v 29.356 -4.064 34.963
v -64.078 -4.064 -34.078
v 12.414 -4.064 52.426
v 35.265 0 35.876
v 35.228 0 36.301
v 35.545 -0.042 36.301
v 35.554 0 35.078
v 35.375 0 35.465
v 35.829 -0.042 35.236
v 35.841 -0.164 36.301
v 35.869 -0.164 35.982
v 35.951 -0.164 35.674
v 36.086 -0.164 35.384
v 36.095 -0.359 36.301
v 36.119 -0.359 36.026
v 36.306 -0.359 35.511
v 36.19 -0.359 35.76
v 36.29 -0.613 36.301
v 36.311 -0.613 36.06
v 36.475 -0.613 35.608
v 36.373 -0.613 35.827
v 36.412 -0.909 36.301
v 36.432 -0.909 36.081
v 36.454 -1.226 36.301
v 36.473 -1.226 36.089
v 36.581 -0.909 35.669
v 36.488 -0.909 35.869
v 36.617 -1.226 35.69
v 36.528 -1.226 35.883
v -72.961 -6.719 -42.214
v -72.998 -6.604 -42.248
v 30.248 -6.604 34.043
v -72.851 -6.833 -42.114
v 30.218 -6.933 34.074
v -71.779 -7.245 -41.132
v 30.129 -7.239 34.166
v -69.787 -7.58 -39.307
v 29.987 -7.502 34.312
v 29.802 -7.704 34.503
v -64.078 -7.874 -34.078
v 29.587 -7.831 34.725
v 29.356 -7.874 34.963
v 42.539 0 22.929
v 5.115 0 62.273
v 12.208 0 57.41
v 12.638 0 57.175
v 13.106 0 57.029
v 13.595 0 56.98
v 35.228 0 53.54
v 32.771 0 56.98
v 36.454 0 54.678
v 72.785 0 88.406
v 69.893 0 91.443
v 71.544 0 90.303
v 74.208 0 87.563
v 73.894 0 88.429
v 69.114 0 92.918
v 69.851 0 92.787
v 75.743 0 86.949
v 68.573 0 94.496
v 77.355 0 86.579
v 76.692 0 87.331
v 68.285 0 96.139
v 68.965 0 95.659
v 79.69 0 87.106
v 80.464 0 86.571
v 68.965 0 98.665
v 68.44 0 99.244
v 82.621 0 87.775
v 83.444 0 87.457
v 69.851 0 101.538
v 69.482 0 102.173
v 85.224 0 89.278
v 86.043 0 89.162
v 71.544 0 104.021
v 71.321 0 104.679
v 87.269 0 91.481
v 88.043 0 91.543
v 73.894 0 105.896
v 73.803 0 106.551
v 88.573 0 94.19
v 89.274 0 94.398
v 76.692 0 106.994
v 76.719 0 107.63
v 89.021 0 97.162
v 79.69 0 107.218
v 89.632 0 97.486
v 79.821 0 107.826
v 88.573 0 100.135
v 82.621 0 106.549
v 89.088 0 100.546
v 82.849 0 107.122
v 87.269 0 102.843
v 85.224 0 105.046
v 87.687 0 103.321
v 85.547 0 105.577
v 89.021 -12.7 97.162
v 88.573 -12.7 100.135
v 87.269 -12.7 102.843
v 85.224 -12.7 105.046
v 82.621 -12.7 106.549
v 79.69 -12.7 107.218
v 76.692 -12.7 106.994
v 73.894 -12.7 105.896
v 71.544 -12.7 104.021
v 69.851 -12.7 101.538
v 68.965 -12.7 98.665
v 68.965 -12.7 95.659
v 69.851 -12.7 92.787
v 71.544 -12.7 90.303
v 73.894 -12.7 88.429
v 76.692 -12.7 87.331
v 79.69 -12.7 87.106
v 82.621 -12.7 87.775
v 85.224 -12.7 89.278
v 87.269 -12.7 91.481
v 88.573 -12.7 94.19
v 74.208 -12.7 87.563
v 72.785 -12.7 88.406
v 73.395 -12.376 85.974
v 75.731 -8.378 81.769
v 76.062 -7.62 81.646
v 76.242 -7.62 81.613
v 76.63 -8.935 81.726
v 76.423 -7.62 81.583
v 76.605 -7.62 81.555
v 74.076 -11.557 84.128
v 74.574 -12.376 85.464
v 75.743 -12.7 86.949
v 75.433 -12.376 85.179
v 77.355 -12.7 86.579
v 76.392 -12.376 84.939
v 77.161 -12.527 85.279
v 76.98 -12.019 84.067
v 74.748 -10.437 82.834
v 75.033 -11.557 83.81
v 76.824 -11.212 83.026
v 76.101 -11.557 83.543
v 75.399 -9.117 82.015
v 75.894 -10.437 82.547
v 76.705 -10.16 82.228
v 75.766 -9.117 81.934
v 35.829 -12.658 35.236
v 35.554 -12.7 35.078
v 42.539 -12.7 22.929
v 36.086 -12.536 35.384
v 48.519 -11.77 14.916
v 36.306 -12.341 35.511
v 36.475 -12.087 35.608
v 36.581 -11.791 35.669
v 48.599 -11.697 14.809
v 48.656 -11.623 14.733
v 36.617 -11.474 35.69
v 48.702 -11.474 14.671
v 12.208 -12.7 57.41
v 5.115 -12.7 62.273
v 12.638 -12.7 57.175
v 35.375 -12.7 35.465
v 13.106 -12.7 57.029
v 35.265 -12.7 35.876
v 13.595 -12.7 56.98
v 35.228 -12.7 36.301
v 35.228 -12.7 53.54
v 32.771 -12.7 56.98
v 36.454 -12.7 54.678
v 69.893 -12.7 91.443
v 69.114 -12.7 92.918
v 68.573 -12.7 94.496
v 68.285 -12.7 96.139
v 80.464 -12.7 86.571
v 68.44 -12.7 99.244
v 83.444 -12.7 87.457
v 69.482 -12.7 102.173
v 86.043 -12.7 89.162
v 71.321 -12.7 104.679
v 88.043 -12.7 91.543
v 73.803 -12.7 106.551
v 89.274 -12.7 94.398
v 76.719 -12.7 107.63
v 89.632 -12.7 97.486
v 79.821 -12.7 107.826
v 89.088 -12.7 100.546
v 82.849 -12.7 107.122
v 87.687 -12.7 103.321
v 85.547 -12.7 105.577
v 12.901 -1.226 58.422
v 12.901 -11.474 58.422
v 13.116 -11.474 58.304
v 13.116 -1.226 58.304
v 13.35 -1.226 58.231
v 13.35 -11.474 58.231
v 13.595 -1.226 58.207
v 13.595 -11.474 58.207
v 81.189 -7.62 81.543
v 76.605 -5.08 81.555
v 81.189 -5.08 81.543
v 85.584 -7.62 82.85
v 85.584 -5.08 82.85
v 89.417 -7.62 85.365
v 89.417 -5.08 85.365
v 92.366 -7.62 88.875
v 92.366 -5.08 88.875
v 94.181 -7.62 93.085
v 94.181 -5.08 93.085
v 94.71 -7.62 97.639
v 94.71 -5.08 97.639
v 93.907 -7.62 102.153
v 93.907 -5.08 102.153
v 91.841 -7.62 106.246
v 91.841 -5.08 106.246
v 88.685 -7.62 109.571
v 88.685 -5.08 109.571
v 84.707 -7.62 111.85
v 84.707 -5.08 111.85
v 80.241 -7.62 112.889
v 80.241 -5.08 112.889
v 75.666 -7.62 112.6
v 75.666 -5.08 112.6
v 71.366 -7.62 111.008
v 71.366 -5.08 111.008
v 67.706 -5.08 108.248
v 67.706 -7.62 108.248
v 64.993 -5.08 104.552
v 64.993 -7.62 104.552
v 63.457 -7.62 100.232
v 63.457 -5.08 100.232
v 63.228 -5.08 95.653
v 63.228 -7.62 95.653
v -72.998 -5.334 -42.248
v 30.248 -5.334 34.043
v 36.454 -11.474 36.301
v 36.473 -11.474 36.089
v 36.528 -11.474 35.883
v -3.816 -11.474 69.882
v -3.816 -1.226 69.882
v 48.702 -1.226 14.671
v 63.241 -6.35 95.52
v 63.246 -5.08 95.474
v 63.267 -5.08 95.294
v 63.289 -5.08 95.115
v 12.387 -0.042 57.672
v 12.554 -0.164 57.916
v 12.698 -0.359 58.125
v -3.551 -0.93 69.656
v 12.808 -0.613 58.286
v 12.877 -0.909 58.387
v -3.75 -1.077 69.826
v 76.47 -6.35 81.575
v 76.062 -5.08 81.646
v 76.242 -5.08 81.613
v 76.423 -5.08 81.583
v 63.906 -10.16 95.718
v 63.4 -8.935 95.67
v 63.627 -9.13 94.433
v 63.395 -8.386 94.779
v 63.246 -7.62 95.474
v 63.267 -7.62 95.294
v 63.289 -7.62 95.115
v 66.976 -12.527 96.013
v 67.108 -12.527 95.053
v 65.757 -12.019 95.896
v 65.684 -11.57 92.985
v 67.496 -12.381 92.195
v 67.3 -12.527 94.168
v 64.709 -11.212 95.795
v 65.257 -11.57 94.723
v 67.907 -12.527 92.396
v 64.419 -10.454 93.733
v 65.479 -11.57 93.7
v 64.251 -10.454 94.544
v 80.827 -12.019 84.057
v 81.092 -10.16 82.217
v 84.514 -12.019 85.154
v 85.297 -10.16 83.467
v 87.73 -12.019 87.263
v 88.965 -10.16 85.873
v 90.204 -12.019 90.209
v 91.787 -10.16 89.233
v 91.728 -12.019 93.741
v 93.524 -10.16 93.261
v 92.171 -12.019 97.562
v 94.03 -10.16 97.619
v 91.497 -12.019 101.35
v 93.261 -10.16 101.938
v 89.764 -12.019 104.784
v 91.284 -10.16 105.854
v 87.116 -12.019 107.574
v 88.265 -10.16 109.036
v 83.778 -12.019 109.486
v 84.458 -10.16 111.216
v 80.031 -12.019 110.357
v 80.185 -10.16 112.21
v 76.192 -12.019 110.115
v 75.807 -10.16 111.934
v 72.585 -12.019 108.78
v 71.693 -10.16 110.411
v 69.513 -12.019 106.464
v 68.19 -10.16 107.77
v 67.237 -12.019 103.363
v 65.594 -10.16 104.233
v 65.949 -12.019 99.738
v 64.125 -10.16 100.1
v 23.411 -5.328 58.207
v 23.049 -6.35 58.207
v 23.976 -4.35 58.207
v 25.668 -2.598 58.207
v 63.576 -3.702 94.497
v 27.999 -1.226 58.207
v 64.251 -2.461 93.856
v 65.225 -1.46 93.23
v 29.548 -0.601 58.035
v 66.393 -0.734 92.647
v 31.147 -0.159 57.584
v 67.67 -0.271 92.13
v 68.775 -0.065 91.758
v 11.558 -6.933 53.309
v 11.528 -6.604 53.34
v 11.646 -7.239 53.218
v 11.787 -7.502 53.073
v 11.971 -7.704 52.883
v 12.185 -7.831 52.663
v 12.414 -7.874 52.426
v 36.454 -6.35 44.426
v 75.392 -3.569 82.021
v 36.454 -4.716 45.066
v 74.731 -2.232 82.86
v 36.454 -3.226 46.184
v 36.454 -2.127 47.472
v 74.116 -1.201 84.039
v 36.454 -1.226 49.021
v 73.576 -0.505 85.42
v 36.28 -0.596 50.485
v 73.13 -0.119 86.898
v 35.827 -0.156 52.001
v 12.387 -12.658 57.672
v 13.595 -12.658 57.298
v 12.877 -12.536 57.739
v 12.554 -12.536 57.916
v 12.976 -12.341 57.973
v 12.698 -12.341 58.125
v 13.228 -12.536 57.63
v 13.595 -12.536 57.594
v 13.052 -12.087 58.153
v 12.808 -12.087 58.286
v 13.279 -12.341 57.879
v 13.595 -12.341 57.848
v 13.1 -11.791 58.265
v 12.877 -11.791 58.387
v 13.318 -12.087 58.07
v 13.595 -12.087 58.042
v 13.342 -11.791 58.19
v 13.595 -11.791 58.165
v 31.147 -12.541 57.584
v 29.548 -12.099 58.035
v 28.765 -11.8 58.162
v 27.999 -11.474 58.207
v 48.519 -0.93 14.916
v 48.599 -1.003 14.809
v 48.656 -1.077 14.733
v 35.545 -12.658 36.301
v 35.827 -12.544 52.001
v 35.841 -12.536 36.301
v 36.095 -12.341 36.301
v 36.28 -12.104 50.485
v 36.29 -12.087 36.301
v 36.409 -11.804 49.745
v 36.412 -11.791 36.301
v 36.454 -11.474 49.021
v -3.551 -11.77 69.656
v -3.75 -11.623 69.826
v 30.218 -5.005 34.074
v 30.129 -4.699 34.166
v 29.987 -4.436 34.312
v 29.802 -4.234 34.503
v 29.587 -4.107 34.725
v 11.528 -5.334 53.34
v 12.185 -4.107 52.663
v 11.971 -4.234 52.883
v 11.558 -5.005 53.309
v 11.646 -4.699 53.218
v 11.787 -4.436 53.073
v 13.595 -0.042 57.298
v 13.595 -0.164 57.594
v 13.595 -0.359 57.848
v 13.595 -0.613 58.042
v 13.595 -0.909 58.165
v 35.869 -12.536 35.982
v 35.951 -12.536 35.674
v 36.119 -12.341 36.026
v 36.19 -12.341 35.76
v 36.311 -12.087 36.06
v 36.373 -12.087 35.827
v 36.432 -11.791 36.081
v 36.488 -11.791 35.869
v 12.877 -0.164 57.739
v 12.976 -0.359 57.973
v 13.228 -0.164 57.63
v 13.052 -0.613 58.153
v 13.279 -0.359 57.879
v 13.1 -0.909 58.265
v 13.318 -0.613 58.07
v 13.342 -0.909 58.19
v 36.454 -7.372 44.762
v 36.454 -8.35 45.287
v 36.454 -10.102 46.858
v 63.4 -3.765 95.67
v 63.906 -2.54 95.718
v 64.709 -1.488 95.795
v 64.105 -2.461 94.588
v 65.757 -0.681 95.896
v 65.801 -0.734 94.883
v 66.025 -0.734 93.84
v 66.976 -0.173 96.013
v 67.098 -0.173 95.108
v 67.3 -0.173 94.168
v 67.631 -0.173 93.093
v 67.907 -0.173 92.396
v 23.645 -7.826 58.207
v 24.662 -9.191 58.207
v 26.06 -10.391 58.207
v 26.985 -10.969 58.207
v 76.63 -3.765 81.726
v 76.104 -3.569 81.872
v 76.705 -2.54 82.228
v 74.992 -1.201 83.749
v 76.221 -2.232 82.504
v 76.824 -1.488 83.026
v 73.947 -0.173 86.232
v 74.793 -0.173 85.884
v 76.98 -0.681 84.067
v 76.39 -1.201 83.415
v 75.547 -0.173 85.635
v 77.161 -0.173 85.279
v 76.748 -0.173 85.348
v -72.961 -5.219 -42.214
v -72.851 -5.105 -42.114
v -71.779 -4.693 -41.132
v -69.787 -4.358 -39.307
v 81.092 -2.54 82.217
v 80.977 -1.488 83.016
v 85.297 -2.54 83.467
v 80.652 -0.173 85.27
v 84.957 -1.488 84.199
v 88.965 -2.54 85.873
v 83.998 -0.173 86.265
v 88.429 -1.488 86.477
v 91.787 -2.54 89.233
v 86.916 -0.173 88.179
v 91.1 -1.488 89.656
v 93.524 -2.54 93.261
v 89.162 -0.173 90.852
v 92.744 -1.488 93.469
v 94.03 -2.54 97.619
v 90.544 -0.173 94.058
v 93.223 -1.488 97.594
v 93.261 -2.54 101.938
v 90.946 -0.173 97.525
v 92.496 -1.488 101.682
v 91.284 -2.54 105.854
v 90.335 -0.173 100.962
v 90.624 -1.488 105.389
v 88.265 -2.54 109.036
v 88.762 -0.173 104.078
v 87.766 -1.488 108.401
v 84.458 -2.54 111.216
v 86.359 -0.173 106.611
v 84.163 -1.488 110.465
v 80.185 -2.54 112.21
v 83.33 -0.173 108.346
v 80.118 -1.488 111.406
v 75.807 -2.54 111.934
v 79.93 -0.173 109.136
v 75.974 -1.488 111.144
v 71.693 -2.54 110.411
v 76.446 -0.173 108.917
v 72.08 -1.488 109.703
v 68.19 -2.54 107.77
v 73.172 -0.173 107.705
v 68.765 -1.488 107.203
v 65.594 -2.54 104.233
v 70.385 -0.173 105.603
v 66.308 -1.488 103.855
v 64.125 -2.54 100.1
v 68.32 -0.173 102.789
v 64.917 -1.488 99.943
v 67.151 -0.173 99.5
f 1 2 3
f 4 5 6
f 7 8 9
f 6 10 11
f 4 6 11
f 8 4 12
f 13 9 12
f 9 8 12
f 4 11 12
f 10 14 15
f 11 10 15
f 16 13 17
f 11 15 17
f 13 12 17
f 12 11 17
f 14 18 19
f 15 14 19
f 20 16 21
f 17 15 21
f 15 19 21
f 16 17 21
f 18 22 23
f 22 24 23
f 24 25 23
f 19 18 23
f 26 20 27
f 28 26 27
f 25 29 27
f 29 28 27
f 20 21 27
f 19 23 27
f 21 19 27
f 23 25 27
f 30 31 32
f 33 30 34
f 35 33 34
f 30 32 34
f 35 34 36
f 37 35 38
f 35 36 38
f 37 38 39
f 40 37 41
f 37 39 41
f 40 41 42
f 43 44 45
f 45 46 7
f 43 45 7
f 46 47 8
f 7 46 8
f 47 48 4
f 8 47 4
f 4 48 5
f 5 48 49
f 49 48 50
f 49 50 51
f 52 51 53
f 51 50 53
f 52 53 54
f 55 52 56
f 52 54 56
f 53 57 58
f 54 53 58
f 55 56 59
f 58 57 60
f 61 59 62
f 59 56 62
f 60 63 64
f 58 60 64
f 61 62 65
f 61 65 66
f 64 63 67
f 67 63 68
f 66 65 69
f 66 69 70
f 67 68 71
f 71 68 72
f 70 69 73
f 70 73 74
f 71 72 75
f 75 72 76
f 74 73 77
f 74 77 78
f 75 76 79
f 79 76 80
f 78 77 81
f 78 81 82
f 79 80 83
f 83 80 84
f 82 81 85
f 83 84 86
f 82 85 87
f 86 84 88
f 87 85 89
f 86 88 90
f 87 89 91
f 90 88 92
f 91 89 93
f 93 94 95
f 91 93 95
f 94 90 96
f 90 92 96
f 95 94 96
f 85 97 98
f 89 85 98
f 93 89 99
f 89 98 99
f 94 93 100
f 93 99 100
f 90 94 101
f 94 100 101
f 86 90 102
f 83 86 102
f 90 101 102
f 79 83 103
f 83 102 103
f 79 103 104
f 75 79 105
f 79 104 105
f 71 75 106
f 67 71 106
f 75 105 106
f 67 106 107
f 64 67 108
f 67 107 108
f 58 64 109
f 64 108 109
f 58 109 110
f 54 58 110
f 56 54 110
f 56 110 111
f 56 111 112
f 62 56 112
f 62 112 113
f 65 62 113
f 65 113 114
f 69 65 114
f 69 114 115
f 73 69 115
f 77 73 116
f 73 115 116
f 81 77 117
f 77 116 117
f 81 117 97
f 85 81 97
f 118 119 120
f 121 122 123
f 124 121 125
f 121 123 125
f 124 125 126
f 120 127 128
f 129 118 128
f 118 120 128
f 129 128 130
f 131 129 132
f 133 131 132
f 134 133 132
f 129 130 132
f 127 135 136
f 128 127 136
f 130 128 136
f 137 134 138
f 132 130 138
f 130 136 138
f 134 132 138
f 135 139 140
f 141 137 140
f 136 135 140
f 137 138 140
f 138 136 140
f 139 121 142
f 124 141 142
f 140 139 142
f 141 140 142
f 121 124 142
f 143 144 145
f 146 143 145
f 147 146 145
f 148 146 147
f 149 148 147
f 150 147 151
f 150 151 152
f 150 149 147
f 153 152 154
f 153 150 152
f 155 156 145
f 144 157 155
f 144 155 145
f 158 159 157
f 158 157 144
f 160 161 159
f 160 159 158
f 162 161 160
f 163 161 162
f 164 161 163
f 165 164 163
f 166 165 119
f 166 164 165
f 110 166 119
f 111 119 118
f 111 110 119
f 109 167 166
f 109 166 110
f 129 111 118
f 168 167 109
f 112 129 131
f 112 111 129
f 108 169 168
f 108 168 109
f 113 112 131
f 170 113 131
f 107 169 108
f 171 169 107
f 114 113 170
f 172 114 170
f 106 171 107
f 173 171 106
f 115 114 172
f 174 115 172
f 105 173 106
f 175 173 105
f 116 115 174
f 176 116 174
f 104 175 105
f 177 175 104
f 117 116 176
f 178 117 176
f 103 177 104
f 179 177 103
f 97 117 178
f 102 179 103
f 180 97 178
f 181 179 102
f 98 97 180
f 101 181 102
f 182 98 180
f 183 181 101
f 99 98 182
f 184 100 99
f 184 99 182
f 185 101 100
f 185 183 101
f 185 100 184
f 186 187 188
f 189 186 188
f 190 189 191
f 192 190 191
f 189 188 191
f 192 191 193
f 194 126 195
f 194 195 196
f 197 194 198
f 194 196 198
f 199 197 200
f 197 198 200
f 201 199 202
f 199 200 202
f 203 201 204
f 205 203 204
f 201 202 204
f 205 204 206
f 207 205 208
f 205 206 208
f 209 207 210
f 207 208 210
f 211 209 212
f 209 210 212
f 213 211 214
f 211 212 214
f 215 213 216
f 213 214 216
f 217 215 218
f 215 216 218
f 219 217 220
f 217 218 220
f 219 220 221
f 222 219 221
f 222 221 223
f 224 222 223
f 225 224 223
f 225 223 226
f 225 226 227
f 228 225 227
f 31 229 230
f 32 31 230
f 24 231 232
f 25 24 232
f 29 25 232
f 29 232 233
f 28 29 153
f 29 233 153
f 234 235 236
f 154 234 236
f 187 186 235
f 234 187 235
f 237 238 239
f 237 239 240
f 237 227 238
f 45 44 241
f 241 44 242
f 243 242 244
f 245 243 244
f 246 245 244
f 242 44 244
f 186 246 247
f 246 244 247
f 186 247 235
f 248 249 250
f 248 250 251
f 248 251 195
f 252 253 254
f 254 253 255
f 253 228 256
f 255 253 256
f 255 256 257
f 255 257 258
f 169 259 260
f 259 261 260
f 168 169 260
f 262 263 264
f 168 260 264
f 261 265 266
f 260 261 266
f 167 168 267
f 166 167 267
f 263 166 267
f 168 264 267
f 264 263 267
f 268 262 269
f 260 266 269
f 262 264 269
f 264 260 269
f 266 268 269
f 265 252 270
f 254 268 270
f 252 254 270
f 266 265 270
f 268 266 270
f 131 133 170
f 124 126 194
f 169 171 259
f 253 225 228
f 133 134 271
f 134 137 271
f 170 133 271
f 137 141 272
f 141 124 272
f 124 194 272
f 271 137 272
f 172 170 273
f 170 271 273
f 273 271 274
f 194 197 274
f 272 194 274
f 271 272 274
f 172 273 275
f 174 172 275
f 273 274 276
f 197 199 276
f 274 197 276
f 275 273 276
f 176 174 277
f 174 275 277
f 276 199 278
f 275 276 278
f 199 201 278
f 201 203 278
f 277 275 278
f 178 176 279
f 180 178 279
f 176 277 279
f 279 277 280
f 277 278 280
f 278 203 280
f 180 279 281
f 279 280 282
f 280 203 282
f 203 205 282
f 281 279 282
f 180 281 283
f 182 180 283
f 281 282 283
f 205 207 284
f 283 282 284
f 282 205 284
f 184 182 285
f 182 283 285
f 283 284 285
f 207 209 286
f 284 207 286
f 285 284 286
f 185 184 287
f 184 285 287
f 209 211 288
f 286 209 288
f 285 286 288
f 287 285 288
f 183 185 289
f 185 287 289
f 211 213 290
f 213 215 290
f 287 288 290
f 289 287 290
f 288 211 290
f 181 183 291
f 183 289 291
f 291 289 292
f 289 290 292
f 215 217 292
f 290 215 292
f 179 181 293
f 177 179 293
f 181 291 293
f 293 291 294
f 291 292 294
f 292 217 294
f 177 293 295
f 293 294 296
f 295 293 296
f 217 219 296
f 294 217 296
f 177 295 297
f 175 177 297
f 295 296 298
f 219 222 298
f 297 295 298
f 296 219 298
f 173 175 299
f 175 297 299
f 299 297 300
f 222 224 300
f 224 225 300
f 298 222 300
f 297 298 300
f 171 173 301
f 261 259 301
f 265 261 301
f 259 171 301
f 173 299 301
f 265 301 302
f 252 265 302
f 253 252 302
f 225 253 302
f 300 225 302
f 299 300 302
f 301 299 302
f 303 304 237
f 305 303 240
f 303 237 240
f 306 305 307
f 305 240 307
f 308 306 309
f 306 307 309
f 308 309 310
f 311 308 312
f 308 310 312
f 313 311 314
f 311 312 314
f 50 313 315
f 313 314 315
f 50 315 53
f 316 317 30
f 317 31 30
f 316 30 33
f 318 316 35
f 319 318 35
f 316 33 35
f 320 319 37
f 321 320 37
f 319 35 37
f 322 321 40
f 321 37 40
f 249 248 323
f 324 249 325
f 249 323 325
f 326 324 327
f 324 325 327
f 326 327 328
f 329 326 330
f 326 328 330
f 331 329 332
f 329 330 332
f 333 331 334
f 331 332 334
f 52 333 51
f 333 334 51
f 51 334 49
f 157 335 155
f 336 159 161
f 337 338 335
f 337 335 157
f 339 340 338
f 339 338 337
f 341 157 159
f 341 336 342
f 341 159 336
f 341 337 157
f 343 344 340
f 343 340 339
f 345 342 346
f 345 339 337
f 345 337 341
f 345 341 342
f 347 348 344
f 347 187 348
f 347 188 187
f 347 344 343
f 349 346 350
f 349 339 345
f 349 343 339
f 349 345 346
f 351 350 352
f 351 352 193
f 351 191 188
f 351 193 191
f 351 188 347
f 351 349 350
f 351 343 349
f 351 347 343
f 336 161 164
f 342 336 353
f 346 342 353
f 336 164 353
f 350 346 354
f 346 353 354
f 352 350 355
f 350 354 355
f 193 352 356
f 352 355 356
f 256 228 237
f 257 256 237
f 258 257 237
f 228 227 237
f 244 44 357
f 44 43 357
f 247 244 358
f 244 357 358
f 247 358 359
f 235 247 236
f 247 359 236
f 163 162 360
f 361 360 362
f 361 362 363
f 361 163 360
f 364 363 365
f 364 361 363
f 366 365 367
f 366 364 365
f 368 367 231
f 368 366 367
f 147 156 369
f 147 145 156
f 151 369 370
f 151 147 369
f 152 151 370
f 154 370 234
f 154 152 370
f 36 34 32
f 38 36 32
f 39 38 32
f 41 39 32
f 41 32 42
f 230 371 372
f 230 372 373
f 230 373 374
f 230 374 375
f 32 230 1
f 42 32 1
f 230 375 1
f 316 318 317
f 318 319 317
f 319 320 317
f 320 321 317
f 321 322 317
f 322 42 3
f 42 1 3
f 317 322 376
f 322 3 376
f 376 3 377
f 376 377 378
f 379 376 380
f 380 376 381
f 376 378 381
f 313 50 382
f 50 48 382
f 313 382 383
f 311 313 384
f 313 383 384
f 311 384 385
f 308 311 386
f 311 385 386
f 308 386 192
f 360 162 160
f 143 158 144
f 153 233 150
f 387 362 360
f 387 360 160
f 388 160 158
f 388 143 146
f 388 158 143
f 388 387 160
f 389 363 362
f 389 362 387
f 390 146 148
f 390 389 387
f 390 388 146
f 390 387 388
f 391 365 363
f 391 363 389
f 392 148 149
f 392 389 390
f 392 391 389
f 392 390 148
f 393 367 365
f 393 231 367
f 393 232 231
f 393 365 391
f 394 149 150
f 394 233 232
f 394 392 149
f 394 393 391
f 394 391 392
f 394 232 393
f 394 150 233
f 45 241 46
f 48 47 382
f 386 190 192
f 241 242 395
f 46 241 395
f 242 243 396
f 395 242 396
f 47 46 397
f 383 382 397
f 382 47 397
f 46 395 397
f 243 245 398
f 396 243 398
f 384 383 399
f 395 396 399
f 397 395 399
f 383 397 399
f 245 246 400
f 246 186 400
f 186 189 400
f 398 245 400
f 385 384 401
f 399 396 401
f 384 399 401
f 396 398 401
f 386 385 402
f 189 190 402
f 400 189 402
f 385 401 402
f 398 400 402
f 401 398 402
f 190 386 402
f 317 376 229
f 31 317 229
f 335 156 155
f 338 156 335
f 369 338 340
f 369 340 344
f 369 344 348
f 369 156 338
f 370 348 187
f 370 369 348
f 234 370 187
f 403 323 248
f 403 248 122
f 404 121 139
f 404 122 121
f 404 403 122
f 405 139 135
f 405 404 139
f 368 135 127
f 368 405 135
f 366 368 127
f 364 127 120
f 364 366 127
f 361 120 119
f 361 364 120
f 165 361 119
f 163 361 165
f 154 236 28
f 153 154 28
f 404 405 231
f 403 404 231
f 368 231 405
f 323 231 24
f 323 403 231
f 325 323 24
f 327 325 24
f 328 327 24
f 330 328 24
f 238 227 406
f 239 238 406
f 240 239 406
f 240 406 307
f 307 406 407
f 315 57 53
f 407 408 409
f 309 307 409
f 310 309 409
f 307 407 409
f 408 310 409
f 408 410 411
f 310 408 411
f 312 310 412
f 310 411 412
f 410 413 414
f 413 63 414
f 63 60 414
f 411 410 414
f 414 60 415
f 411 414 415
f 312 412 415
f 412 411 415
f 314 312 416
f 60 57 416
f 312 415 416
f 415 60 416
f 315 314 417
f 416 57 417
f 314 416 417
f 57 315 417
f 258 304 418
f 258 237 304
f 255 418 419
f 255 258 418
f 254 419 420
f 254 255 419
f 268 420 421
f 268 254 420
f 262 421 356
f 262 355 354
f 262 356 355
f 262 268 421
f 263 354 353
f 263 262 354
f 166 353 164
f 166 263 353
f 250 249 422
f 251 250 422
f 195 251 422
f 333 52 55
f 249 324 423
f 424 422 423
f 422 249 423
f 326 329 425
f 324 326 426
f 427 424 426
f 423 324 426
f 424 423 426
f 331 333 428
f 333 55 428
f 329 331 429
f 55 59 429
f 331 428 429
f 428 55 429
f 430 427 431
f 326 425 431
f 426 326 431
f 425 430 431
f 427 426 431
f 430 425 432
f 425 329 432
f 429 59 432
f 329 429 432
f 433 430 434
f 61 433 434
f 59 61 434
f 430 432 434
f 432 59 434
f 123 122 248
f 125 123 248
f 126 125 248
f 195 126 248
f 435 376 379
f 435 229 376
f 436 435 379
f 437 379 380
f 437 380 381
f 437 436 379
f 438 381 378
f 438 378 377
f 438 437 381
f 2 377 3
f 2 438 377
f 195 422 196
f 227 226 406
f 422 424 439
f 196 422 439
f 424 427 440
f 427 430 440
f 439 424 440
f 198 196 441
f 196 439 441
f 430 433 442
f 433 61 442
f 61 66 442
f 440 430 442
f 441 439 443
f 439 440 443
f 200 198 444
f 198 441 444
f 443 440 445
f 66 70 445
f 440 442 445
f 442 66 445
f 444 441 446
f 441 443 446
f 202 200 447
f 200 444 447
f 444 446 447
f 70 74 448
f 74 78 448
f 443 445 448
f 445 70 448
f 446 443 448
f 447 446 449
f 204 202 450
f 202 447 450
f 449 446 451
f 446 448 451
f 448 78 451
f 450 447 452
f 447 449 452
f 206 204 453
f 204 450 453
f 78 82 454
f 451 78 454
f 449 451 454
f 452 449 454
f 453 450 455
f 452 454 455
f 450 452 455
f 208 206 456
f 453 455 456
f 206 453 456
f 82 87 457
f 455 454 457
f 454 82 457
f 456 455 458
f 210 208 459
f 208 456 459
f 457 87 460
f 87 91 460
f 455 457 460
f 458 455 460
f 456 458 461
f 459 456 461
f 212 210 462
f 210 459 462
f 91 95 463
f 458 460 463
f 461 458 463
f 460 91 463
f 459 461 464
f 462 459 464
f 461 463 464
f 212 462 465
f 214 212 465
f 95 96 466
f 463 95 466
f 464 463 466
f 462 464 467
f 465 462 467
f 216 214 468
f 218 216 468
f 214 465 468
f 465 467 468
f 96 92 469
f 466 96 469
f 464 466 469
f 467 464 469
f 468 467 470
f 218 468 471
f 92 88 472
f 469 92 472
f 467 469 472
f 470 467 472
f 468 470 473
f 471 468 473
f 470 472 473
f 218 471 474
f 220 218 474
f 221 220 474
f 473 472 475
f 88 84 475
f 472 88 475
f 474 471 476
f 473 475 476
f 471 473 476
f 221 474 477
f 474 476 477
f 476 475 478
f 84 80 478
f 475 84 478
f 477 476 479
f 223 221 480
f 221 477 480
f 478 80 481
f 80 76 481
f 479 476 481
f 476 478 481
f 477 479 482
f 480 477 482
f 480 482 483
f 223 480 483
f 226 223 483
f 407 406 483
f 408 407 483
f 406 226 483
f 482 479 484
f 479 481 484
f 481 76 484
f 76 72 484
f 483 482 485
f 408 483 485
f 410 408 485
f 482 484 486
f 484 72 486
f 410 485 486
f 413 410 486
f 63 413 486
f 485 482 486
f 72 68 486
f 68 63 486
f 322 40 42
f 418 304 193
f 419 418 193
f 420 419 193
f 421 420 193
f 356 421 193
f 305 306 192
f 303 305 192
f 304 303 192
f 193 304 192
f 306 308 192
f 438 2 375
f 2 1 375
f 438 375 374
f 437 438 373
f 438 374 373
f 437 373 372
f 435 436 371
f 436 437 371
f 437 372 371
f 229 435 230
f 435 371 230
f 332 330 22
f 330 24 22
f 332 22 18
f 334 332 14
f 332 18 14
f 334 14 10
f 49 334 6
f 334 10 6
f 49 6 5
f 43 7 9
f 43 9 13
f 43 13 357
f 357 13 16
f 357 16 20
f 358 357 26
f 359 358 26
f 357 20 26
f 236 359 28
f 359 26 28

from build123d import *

# Parameters (mm, degrees)
F1_DEPTH     = 12.7
F3_START     = 4.064
F3_DEPTH     = 3.81
F4_T4_DEPTH  = 93.1383939159
F4_S5_R      = 15.7806026061
F4_T6_DEPTH  = 52
F4_T11_DEPTH = 93.1383939159
F4_S12_R     = 15.7806026061
F4_T13_DEPTH = 52
F4_T18_DEPTH = 92.8850738108
F4_S20_R     = 15.7806026061
F4_T21_DEPTH = 52
F4_T25_DEPTH = 92.8850738108
F4_S27_R     = 15.7806026061
F4_T28_DEPTH = 52
F5_R         = 5.07999
F6_R         = 1.2264204897
F7_R         = 1.27
F8_R         = 1.27
F9_R         = 10.0844220232
F10_DEPTH    = 12.7


# Not quite as in the source:
# - a fillet or chamfer that OpenCascade refuses, or shapes differently, is made with other operations: its cross-section is extruded or revolved along the edge and cut away or added
# - a fillet or chamfer is up to 0.001 mm smaller than in the source, because OpenCascade refuses the exact size


with BuildPart() as f1:
    # F0 (on Front) → F1 (new body)
    with BuildSketch(Plane.XZ):
        with BuildLine():
            Line((13.2145041692, 58.2067854702), (-3.8163531803, 69.8823442173))
            Line((-3.8163531803, 69.8823442173), (48.701737076, 14.6710211411))
            Line((48.701737076, 14.6710211411), (36.4542003432, 35.9734042756))
            Line((36.4542003432, 35.9734042756), (36.4542003432, 44.2807382619))
            Line((36.4542003432, 44.2807382619), (76.6045332289, 81.554791994))
            ThreePointArc((76.6045332289, 81.554791994), (67.4885852958, 86.3005665919), (63.228149501, 95.6531902927))
            Line((63.228149501, 95.6531902927), (22.8921659291, 58.2067854702))
            Line((22.8921659291, 58.2067854702), (13.2145041692, 58.2067854702))
        make_face()
        with BuildLine():
            ThreePointArc((94.7170448112, 97.1621498466), (78.1810966455, 112.9246646109), (63.228149501, 95.6531902927))
            ThreePointArc((63.228149501, 95.6531902927), (67.4885852958, 86.3005665919), (76.6045332289, 81.554791994))
            ThreePointArc((76.6045332289, 81.554791994), (89.2376190734, 85.207520043), (94.7170448112, 97.1621498466))
        make_face()
    extrude(amount=F1_DEPTH)

    # F4: fillet of radius 7.62 on 4 edges, made by hand


with BuildPart() as f3:
    # F2 (on Front) → F3 (new body)
    with BuildSketch(Plane.XZ.offset(F3_START)):
        Polygon((11.5275448188, 53.340408951), (-72.9976892471, -42.2478355467), (30.2482489496, 34.0428091586), align=None)
    extrude(amount=F3_DEPTH)

    # F7
    f7_edges = [f3.edges().sort_by_distance(p)[0] for p in [
        (-21.37472, -7.874, -4.102513),
        (-30.735072, -7.874, 5.546287),
    ]]
    fillet(f7_edges, radius=F7_R)

    # F8
    f8_edges = [f3.edges().sort_by_distance(p)[0] for p in [
        (-30.735072, -4.064, 5.546287),
        (-21.37472, -4.064, -4.102513),
    ]]
    fillet(f8_edges, radius=F8_R)


with BuildPart() as f4_tool2:
    # F4_s3 → F4_t4 (new body)
    with BuildSketch(Plane(origin=(95.6156726243, 0, 88.7659818207), x_dir=(0, 1, 0), z_dir=(-0.7328699241, 0, -0.6803687782))):
        with BuildLine():
            ThreePointArc((-5.08, -27.0828874864), (-10.4681536726, -24.8510411591), (-12.7, -19.4628874864))
            Line((-12.7, -19.4628874864), (-12.7, -27.0828874864))
            Line((-12.7, -27.0828874864), (-5.08, -27.0828874864))
        make_face()
    extrude(amount=F4_T4_DEPTH)

    # F4_s5 → F4_t6 (cut, symmetric)
    with BuildSketch(Plane.XZ.offset(8.9)):
        with Locations((78.936442205, 97.1621498466)):
            Circle(F4_S5_R)
    extrude(amount=F4_T6_DEPTH, both=True, mode=Mode.SUBTRACT)

    split(bisect_by=Plane.XY.offset(58.2067854702), keep=Keep.TOP)


with BuildPart() as f1_1:
    add(f1.part)

    # F4_t1: cut F4_tool2
    add(f4_tool2.part, mode=Mode.SUBTRACT)


with BuildPart() as f4_tool9:
    # F4_s10 → F4_t11 (new body)
    with BuildSketch(Plane(origin=(95.6156726243, 0, 88.7659818207), x_dir=(0, 1, 0), z_dir=(-0.7328699241, 0, -0.6803687782))):
        with BuildLine():
            ThreePointArc((-7.62, -27.0828874864), (-2.2318463274, -24.8510411591), (0, -19.4628874864))
            Line((0, -19.4628874864), (0, -27.0828874864))
            Line((0, -27.0828874864), (-7.62, -27.0828874864))
        make_face()
    extrude(amount=F4_T11_DEPTH)

    # F4_s12 → F4_t13 (cut, symmetric)
    with BuildSketch(Plane.XZ.offset(3.8)):
        with Locations((78.936442205, 97.1621498466)):
            Circle(F4_S12_R)
    extrude(amount=F4_T13_DEPTH, both=True, mode=Mode.SUBTRACT)

    split(bisect_by=Plane.XY.offset(58.2067854702), keep=Keep.TOP)


with BuildPart() as f1_2:
    add(f1_1.part)

    # F4_t8: cut F4_tool9
    add(f4_tool9.part, mode=Mode.SUBTRACT)


with BuildPart() as f4_tool16:
    # F4_s17 → F4_t18 (new body)
    with BuildSketch(Plane(origin=(27.6976599878, 0, 25.7134621917), x_dir=(0, 1, 0), z_dir=(0.7328699241, 0, 0.6803687782))):
        with BuildLine():
            ThreePointArc((-5.08, 7.6497215416), (-10.4681536726, 9.8815678689), (-12.7, 15.2697215416))
            Line((-12.7, 15.2697215416), (-12.7, 7.6497215416))
            Line((-12.7, 7.6497215416), (-5.08, 7.6497215416))
        make_face()
    extrude(amount=F4_T18_DEPTH)

    split(bisect_by=Plane.YZ.offset(36.4542003432), keep=Keep.TOP)

    # F4_s20 → F4_t21 (cut, symmetric)
    with BuildSketch(Plane.XZ.offset(8.9)):
        with Locations((78.936442205, 97.1621498466)):
            Circle(F4_S20_R)
    extrude(amount=F4_T21_DEPTH, both=True, mode=Mode.SUBTRACT)


with BuildPart() as f1_3:
    add(f1_2.part)

    # F4_t15: cut F4_tool16
    add(f4_tool16.part, mode=Mode.SUBTRACT)


with BuildPart() as f4_tool23:
    # F4_s24 → F4_t25 (new body)
    with BuildSketch(Plane(origin=(27.6976599878, 0, 25.7134621917), x_dir=(0, 1, 0), z_dir=(0.7328699241, 0, 0.6803687782))):
        with BuildLine():
            ThreePointArc((-7.62, 7.6497215416), (-2.2318463274, 9.8815678689), (0, 15.2697215416))
            Line((0, 15.2697215416), (0, 7.6497215416))
            Line((0, 7.6497215416), (-7.62, 7.6497215416))
        make_face()
    extrude(amount=F4_T25_DEPTH)

    split(bisect_by=Plane.YZ.offset(36.4542003432), keep=Keep.TOP)

    # F4_s27 → F4_t28 (cut, symmetric)
    with BuildSketch(Plane.XZ.offset(3.8)):
        with Locations((78.936442205, 97.1621498466)):
            Circle(F4_S27_R)
    extrude(amount=F4_T28_DEPTH, both=True, mode=Mode.SUBTRACT)


with BuildPart() as f1_4:
    add(f1_3.part)

    # F4_t22: cut F4_tool23
    add(f4_tool23.part, mode=Mode.SUBTRACT)

    # F5 (radius 5.08 in the source; OpenCascade refuses exactly that, so slightly less here)
    f5_edges = [f1_4.edges().sort_by_distance(p)[0] for p in [
        (87.15426, 0, 110.634154),
        (87.15426, -12.7, 110.634154),
    ]]
    fillet(f5_edges, radius=F5_R)

    # F6
    f6_edges = [f1_4.edges().sort_by_distance(p)[0] for p in [
        (4.699075, 0, 64.044565),
        (23.653239, 0, 58.206785),
        (4.699075, -12.7, 64.044565),
        (23.653239, -12.7, 58.206785),
        (36.4542, 0, 45.325811),
        (42.577969, 0, 25.322213),
        (36.4542, -12.7, 45.325811),
        (42.577969, -12.7, 25.322213),
        (36.4542, -6.35, 35.973404),
        (13.214504, -6.35, 58.206785),
        (22.442692, 0, 42.276683),
        (22.442692, -12.7, 42.276683),
    ]]
    fillet(f6_edges, radius=F6_R)

    # F9 (on face) → F10 (cut)
    with BuildSketch(Plane.XZ.offset(12.7)):
        with Locations((78.936442205, 97.1621498466)):
            Circle(F9_R)
    extrude(amount=-F10_DEPTH, mode=Mode.SUBTRACT)


solid = Compound([f3.part, f1_4.part])
